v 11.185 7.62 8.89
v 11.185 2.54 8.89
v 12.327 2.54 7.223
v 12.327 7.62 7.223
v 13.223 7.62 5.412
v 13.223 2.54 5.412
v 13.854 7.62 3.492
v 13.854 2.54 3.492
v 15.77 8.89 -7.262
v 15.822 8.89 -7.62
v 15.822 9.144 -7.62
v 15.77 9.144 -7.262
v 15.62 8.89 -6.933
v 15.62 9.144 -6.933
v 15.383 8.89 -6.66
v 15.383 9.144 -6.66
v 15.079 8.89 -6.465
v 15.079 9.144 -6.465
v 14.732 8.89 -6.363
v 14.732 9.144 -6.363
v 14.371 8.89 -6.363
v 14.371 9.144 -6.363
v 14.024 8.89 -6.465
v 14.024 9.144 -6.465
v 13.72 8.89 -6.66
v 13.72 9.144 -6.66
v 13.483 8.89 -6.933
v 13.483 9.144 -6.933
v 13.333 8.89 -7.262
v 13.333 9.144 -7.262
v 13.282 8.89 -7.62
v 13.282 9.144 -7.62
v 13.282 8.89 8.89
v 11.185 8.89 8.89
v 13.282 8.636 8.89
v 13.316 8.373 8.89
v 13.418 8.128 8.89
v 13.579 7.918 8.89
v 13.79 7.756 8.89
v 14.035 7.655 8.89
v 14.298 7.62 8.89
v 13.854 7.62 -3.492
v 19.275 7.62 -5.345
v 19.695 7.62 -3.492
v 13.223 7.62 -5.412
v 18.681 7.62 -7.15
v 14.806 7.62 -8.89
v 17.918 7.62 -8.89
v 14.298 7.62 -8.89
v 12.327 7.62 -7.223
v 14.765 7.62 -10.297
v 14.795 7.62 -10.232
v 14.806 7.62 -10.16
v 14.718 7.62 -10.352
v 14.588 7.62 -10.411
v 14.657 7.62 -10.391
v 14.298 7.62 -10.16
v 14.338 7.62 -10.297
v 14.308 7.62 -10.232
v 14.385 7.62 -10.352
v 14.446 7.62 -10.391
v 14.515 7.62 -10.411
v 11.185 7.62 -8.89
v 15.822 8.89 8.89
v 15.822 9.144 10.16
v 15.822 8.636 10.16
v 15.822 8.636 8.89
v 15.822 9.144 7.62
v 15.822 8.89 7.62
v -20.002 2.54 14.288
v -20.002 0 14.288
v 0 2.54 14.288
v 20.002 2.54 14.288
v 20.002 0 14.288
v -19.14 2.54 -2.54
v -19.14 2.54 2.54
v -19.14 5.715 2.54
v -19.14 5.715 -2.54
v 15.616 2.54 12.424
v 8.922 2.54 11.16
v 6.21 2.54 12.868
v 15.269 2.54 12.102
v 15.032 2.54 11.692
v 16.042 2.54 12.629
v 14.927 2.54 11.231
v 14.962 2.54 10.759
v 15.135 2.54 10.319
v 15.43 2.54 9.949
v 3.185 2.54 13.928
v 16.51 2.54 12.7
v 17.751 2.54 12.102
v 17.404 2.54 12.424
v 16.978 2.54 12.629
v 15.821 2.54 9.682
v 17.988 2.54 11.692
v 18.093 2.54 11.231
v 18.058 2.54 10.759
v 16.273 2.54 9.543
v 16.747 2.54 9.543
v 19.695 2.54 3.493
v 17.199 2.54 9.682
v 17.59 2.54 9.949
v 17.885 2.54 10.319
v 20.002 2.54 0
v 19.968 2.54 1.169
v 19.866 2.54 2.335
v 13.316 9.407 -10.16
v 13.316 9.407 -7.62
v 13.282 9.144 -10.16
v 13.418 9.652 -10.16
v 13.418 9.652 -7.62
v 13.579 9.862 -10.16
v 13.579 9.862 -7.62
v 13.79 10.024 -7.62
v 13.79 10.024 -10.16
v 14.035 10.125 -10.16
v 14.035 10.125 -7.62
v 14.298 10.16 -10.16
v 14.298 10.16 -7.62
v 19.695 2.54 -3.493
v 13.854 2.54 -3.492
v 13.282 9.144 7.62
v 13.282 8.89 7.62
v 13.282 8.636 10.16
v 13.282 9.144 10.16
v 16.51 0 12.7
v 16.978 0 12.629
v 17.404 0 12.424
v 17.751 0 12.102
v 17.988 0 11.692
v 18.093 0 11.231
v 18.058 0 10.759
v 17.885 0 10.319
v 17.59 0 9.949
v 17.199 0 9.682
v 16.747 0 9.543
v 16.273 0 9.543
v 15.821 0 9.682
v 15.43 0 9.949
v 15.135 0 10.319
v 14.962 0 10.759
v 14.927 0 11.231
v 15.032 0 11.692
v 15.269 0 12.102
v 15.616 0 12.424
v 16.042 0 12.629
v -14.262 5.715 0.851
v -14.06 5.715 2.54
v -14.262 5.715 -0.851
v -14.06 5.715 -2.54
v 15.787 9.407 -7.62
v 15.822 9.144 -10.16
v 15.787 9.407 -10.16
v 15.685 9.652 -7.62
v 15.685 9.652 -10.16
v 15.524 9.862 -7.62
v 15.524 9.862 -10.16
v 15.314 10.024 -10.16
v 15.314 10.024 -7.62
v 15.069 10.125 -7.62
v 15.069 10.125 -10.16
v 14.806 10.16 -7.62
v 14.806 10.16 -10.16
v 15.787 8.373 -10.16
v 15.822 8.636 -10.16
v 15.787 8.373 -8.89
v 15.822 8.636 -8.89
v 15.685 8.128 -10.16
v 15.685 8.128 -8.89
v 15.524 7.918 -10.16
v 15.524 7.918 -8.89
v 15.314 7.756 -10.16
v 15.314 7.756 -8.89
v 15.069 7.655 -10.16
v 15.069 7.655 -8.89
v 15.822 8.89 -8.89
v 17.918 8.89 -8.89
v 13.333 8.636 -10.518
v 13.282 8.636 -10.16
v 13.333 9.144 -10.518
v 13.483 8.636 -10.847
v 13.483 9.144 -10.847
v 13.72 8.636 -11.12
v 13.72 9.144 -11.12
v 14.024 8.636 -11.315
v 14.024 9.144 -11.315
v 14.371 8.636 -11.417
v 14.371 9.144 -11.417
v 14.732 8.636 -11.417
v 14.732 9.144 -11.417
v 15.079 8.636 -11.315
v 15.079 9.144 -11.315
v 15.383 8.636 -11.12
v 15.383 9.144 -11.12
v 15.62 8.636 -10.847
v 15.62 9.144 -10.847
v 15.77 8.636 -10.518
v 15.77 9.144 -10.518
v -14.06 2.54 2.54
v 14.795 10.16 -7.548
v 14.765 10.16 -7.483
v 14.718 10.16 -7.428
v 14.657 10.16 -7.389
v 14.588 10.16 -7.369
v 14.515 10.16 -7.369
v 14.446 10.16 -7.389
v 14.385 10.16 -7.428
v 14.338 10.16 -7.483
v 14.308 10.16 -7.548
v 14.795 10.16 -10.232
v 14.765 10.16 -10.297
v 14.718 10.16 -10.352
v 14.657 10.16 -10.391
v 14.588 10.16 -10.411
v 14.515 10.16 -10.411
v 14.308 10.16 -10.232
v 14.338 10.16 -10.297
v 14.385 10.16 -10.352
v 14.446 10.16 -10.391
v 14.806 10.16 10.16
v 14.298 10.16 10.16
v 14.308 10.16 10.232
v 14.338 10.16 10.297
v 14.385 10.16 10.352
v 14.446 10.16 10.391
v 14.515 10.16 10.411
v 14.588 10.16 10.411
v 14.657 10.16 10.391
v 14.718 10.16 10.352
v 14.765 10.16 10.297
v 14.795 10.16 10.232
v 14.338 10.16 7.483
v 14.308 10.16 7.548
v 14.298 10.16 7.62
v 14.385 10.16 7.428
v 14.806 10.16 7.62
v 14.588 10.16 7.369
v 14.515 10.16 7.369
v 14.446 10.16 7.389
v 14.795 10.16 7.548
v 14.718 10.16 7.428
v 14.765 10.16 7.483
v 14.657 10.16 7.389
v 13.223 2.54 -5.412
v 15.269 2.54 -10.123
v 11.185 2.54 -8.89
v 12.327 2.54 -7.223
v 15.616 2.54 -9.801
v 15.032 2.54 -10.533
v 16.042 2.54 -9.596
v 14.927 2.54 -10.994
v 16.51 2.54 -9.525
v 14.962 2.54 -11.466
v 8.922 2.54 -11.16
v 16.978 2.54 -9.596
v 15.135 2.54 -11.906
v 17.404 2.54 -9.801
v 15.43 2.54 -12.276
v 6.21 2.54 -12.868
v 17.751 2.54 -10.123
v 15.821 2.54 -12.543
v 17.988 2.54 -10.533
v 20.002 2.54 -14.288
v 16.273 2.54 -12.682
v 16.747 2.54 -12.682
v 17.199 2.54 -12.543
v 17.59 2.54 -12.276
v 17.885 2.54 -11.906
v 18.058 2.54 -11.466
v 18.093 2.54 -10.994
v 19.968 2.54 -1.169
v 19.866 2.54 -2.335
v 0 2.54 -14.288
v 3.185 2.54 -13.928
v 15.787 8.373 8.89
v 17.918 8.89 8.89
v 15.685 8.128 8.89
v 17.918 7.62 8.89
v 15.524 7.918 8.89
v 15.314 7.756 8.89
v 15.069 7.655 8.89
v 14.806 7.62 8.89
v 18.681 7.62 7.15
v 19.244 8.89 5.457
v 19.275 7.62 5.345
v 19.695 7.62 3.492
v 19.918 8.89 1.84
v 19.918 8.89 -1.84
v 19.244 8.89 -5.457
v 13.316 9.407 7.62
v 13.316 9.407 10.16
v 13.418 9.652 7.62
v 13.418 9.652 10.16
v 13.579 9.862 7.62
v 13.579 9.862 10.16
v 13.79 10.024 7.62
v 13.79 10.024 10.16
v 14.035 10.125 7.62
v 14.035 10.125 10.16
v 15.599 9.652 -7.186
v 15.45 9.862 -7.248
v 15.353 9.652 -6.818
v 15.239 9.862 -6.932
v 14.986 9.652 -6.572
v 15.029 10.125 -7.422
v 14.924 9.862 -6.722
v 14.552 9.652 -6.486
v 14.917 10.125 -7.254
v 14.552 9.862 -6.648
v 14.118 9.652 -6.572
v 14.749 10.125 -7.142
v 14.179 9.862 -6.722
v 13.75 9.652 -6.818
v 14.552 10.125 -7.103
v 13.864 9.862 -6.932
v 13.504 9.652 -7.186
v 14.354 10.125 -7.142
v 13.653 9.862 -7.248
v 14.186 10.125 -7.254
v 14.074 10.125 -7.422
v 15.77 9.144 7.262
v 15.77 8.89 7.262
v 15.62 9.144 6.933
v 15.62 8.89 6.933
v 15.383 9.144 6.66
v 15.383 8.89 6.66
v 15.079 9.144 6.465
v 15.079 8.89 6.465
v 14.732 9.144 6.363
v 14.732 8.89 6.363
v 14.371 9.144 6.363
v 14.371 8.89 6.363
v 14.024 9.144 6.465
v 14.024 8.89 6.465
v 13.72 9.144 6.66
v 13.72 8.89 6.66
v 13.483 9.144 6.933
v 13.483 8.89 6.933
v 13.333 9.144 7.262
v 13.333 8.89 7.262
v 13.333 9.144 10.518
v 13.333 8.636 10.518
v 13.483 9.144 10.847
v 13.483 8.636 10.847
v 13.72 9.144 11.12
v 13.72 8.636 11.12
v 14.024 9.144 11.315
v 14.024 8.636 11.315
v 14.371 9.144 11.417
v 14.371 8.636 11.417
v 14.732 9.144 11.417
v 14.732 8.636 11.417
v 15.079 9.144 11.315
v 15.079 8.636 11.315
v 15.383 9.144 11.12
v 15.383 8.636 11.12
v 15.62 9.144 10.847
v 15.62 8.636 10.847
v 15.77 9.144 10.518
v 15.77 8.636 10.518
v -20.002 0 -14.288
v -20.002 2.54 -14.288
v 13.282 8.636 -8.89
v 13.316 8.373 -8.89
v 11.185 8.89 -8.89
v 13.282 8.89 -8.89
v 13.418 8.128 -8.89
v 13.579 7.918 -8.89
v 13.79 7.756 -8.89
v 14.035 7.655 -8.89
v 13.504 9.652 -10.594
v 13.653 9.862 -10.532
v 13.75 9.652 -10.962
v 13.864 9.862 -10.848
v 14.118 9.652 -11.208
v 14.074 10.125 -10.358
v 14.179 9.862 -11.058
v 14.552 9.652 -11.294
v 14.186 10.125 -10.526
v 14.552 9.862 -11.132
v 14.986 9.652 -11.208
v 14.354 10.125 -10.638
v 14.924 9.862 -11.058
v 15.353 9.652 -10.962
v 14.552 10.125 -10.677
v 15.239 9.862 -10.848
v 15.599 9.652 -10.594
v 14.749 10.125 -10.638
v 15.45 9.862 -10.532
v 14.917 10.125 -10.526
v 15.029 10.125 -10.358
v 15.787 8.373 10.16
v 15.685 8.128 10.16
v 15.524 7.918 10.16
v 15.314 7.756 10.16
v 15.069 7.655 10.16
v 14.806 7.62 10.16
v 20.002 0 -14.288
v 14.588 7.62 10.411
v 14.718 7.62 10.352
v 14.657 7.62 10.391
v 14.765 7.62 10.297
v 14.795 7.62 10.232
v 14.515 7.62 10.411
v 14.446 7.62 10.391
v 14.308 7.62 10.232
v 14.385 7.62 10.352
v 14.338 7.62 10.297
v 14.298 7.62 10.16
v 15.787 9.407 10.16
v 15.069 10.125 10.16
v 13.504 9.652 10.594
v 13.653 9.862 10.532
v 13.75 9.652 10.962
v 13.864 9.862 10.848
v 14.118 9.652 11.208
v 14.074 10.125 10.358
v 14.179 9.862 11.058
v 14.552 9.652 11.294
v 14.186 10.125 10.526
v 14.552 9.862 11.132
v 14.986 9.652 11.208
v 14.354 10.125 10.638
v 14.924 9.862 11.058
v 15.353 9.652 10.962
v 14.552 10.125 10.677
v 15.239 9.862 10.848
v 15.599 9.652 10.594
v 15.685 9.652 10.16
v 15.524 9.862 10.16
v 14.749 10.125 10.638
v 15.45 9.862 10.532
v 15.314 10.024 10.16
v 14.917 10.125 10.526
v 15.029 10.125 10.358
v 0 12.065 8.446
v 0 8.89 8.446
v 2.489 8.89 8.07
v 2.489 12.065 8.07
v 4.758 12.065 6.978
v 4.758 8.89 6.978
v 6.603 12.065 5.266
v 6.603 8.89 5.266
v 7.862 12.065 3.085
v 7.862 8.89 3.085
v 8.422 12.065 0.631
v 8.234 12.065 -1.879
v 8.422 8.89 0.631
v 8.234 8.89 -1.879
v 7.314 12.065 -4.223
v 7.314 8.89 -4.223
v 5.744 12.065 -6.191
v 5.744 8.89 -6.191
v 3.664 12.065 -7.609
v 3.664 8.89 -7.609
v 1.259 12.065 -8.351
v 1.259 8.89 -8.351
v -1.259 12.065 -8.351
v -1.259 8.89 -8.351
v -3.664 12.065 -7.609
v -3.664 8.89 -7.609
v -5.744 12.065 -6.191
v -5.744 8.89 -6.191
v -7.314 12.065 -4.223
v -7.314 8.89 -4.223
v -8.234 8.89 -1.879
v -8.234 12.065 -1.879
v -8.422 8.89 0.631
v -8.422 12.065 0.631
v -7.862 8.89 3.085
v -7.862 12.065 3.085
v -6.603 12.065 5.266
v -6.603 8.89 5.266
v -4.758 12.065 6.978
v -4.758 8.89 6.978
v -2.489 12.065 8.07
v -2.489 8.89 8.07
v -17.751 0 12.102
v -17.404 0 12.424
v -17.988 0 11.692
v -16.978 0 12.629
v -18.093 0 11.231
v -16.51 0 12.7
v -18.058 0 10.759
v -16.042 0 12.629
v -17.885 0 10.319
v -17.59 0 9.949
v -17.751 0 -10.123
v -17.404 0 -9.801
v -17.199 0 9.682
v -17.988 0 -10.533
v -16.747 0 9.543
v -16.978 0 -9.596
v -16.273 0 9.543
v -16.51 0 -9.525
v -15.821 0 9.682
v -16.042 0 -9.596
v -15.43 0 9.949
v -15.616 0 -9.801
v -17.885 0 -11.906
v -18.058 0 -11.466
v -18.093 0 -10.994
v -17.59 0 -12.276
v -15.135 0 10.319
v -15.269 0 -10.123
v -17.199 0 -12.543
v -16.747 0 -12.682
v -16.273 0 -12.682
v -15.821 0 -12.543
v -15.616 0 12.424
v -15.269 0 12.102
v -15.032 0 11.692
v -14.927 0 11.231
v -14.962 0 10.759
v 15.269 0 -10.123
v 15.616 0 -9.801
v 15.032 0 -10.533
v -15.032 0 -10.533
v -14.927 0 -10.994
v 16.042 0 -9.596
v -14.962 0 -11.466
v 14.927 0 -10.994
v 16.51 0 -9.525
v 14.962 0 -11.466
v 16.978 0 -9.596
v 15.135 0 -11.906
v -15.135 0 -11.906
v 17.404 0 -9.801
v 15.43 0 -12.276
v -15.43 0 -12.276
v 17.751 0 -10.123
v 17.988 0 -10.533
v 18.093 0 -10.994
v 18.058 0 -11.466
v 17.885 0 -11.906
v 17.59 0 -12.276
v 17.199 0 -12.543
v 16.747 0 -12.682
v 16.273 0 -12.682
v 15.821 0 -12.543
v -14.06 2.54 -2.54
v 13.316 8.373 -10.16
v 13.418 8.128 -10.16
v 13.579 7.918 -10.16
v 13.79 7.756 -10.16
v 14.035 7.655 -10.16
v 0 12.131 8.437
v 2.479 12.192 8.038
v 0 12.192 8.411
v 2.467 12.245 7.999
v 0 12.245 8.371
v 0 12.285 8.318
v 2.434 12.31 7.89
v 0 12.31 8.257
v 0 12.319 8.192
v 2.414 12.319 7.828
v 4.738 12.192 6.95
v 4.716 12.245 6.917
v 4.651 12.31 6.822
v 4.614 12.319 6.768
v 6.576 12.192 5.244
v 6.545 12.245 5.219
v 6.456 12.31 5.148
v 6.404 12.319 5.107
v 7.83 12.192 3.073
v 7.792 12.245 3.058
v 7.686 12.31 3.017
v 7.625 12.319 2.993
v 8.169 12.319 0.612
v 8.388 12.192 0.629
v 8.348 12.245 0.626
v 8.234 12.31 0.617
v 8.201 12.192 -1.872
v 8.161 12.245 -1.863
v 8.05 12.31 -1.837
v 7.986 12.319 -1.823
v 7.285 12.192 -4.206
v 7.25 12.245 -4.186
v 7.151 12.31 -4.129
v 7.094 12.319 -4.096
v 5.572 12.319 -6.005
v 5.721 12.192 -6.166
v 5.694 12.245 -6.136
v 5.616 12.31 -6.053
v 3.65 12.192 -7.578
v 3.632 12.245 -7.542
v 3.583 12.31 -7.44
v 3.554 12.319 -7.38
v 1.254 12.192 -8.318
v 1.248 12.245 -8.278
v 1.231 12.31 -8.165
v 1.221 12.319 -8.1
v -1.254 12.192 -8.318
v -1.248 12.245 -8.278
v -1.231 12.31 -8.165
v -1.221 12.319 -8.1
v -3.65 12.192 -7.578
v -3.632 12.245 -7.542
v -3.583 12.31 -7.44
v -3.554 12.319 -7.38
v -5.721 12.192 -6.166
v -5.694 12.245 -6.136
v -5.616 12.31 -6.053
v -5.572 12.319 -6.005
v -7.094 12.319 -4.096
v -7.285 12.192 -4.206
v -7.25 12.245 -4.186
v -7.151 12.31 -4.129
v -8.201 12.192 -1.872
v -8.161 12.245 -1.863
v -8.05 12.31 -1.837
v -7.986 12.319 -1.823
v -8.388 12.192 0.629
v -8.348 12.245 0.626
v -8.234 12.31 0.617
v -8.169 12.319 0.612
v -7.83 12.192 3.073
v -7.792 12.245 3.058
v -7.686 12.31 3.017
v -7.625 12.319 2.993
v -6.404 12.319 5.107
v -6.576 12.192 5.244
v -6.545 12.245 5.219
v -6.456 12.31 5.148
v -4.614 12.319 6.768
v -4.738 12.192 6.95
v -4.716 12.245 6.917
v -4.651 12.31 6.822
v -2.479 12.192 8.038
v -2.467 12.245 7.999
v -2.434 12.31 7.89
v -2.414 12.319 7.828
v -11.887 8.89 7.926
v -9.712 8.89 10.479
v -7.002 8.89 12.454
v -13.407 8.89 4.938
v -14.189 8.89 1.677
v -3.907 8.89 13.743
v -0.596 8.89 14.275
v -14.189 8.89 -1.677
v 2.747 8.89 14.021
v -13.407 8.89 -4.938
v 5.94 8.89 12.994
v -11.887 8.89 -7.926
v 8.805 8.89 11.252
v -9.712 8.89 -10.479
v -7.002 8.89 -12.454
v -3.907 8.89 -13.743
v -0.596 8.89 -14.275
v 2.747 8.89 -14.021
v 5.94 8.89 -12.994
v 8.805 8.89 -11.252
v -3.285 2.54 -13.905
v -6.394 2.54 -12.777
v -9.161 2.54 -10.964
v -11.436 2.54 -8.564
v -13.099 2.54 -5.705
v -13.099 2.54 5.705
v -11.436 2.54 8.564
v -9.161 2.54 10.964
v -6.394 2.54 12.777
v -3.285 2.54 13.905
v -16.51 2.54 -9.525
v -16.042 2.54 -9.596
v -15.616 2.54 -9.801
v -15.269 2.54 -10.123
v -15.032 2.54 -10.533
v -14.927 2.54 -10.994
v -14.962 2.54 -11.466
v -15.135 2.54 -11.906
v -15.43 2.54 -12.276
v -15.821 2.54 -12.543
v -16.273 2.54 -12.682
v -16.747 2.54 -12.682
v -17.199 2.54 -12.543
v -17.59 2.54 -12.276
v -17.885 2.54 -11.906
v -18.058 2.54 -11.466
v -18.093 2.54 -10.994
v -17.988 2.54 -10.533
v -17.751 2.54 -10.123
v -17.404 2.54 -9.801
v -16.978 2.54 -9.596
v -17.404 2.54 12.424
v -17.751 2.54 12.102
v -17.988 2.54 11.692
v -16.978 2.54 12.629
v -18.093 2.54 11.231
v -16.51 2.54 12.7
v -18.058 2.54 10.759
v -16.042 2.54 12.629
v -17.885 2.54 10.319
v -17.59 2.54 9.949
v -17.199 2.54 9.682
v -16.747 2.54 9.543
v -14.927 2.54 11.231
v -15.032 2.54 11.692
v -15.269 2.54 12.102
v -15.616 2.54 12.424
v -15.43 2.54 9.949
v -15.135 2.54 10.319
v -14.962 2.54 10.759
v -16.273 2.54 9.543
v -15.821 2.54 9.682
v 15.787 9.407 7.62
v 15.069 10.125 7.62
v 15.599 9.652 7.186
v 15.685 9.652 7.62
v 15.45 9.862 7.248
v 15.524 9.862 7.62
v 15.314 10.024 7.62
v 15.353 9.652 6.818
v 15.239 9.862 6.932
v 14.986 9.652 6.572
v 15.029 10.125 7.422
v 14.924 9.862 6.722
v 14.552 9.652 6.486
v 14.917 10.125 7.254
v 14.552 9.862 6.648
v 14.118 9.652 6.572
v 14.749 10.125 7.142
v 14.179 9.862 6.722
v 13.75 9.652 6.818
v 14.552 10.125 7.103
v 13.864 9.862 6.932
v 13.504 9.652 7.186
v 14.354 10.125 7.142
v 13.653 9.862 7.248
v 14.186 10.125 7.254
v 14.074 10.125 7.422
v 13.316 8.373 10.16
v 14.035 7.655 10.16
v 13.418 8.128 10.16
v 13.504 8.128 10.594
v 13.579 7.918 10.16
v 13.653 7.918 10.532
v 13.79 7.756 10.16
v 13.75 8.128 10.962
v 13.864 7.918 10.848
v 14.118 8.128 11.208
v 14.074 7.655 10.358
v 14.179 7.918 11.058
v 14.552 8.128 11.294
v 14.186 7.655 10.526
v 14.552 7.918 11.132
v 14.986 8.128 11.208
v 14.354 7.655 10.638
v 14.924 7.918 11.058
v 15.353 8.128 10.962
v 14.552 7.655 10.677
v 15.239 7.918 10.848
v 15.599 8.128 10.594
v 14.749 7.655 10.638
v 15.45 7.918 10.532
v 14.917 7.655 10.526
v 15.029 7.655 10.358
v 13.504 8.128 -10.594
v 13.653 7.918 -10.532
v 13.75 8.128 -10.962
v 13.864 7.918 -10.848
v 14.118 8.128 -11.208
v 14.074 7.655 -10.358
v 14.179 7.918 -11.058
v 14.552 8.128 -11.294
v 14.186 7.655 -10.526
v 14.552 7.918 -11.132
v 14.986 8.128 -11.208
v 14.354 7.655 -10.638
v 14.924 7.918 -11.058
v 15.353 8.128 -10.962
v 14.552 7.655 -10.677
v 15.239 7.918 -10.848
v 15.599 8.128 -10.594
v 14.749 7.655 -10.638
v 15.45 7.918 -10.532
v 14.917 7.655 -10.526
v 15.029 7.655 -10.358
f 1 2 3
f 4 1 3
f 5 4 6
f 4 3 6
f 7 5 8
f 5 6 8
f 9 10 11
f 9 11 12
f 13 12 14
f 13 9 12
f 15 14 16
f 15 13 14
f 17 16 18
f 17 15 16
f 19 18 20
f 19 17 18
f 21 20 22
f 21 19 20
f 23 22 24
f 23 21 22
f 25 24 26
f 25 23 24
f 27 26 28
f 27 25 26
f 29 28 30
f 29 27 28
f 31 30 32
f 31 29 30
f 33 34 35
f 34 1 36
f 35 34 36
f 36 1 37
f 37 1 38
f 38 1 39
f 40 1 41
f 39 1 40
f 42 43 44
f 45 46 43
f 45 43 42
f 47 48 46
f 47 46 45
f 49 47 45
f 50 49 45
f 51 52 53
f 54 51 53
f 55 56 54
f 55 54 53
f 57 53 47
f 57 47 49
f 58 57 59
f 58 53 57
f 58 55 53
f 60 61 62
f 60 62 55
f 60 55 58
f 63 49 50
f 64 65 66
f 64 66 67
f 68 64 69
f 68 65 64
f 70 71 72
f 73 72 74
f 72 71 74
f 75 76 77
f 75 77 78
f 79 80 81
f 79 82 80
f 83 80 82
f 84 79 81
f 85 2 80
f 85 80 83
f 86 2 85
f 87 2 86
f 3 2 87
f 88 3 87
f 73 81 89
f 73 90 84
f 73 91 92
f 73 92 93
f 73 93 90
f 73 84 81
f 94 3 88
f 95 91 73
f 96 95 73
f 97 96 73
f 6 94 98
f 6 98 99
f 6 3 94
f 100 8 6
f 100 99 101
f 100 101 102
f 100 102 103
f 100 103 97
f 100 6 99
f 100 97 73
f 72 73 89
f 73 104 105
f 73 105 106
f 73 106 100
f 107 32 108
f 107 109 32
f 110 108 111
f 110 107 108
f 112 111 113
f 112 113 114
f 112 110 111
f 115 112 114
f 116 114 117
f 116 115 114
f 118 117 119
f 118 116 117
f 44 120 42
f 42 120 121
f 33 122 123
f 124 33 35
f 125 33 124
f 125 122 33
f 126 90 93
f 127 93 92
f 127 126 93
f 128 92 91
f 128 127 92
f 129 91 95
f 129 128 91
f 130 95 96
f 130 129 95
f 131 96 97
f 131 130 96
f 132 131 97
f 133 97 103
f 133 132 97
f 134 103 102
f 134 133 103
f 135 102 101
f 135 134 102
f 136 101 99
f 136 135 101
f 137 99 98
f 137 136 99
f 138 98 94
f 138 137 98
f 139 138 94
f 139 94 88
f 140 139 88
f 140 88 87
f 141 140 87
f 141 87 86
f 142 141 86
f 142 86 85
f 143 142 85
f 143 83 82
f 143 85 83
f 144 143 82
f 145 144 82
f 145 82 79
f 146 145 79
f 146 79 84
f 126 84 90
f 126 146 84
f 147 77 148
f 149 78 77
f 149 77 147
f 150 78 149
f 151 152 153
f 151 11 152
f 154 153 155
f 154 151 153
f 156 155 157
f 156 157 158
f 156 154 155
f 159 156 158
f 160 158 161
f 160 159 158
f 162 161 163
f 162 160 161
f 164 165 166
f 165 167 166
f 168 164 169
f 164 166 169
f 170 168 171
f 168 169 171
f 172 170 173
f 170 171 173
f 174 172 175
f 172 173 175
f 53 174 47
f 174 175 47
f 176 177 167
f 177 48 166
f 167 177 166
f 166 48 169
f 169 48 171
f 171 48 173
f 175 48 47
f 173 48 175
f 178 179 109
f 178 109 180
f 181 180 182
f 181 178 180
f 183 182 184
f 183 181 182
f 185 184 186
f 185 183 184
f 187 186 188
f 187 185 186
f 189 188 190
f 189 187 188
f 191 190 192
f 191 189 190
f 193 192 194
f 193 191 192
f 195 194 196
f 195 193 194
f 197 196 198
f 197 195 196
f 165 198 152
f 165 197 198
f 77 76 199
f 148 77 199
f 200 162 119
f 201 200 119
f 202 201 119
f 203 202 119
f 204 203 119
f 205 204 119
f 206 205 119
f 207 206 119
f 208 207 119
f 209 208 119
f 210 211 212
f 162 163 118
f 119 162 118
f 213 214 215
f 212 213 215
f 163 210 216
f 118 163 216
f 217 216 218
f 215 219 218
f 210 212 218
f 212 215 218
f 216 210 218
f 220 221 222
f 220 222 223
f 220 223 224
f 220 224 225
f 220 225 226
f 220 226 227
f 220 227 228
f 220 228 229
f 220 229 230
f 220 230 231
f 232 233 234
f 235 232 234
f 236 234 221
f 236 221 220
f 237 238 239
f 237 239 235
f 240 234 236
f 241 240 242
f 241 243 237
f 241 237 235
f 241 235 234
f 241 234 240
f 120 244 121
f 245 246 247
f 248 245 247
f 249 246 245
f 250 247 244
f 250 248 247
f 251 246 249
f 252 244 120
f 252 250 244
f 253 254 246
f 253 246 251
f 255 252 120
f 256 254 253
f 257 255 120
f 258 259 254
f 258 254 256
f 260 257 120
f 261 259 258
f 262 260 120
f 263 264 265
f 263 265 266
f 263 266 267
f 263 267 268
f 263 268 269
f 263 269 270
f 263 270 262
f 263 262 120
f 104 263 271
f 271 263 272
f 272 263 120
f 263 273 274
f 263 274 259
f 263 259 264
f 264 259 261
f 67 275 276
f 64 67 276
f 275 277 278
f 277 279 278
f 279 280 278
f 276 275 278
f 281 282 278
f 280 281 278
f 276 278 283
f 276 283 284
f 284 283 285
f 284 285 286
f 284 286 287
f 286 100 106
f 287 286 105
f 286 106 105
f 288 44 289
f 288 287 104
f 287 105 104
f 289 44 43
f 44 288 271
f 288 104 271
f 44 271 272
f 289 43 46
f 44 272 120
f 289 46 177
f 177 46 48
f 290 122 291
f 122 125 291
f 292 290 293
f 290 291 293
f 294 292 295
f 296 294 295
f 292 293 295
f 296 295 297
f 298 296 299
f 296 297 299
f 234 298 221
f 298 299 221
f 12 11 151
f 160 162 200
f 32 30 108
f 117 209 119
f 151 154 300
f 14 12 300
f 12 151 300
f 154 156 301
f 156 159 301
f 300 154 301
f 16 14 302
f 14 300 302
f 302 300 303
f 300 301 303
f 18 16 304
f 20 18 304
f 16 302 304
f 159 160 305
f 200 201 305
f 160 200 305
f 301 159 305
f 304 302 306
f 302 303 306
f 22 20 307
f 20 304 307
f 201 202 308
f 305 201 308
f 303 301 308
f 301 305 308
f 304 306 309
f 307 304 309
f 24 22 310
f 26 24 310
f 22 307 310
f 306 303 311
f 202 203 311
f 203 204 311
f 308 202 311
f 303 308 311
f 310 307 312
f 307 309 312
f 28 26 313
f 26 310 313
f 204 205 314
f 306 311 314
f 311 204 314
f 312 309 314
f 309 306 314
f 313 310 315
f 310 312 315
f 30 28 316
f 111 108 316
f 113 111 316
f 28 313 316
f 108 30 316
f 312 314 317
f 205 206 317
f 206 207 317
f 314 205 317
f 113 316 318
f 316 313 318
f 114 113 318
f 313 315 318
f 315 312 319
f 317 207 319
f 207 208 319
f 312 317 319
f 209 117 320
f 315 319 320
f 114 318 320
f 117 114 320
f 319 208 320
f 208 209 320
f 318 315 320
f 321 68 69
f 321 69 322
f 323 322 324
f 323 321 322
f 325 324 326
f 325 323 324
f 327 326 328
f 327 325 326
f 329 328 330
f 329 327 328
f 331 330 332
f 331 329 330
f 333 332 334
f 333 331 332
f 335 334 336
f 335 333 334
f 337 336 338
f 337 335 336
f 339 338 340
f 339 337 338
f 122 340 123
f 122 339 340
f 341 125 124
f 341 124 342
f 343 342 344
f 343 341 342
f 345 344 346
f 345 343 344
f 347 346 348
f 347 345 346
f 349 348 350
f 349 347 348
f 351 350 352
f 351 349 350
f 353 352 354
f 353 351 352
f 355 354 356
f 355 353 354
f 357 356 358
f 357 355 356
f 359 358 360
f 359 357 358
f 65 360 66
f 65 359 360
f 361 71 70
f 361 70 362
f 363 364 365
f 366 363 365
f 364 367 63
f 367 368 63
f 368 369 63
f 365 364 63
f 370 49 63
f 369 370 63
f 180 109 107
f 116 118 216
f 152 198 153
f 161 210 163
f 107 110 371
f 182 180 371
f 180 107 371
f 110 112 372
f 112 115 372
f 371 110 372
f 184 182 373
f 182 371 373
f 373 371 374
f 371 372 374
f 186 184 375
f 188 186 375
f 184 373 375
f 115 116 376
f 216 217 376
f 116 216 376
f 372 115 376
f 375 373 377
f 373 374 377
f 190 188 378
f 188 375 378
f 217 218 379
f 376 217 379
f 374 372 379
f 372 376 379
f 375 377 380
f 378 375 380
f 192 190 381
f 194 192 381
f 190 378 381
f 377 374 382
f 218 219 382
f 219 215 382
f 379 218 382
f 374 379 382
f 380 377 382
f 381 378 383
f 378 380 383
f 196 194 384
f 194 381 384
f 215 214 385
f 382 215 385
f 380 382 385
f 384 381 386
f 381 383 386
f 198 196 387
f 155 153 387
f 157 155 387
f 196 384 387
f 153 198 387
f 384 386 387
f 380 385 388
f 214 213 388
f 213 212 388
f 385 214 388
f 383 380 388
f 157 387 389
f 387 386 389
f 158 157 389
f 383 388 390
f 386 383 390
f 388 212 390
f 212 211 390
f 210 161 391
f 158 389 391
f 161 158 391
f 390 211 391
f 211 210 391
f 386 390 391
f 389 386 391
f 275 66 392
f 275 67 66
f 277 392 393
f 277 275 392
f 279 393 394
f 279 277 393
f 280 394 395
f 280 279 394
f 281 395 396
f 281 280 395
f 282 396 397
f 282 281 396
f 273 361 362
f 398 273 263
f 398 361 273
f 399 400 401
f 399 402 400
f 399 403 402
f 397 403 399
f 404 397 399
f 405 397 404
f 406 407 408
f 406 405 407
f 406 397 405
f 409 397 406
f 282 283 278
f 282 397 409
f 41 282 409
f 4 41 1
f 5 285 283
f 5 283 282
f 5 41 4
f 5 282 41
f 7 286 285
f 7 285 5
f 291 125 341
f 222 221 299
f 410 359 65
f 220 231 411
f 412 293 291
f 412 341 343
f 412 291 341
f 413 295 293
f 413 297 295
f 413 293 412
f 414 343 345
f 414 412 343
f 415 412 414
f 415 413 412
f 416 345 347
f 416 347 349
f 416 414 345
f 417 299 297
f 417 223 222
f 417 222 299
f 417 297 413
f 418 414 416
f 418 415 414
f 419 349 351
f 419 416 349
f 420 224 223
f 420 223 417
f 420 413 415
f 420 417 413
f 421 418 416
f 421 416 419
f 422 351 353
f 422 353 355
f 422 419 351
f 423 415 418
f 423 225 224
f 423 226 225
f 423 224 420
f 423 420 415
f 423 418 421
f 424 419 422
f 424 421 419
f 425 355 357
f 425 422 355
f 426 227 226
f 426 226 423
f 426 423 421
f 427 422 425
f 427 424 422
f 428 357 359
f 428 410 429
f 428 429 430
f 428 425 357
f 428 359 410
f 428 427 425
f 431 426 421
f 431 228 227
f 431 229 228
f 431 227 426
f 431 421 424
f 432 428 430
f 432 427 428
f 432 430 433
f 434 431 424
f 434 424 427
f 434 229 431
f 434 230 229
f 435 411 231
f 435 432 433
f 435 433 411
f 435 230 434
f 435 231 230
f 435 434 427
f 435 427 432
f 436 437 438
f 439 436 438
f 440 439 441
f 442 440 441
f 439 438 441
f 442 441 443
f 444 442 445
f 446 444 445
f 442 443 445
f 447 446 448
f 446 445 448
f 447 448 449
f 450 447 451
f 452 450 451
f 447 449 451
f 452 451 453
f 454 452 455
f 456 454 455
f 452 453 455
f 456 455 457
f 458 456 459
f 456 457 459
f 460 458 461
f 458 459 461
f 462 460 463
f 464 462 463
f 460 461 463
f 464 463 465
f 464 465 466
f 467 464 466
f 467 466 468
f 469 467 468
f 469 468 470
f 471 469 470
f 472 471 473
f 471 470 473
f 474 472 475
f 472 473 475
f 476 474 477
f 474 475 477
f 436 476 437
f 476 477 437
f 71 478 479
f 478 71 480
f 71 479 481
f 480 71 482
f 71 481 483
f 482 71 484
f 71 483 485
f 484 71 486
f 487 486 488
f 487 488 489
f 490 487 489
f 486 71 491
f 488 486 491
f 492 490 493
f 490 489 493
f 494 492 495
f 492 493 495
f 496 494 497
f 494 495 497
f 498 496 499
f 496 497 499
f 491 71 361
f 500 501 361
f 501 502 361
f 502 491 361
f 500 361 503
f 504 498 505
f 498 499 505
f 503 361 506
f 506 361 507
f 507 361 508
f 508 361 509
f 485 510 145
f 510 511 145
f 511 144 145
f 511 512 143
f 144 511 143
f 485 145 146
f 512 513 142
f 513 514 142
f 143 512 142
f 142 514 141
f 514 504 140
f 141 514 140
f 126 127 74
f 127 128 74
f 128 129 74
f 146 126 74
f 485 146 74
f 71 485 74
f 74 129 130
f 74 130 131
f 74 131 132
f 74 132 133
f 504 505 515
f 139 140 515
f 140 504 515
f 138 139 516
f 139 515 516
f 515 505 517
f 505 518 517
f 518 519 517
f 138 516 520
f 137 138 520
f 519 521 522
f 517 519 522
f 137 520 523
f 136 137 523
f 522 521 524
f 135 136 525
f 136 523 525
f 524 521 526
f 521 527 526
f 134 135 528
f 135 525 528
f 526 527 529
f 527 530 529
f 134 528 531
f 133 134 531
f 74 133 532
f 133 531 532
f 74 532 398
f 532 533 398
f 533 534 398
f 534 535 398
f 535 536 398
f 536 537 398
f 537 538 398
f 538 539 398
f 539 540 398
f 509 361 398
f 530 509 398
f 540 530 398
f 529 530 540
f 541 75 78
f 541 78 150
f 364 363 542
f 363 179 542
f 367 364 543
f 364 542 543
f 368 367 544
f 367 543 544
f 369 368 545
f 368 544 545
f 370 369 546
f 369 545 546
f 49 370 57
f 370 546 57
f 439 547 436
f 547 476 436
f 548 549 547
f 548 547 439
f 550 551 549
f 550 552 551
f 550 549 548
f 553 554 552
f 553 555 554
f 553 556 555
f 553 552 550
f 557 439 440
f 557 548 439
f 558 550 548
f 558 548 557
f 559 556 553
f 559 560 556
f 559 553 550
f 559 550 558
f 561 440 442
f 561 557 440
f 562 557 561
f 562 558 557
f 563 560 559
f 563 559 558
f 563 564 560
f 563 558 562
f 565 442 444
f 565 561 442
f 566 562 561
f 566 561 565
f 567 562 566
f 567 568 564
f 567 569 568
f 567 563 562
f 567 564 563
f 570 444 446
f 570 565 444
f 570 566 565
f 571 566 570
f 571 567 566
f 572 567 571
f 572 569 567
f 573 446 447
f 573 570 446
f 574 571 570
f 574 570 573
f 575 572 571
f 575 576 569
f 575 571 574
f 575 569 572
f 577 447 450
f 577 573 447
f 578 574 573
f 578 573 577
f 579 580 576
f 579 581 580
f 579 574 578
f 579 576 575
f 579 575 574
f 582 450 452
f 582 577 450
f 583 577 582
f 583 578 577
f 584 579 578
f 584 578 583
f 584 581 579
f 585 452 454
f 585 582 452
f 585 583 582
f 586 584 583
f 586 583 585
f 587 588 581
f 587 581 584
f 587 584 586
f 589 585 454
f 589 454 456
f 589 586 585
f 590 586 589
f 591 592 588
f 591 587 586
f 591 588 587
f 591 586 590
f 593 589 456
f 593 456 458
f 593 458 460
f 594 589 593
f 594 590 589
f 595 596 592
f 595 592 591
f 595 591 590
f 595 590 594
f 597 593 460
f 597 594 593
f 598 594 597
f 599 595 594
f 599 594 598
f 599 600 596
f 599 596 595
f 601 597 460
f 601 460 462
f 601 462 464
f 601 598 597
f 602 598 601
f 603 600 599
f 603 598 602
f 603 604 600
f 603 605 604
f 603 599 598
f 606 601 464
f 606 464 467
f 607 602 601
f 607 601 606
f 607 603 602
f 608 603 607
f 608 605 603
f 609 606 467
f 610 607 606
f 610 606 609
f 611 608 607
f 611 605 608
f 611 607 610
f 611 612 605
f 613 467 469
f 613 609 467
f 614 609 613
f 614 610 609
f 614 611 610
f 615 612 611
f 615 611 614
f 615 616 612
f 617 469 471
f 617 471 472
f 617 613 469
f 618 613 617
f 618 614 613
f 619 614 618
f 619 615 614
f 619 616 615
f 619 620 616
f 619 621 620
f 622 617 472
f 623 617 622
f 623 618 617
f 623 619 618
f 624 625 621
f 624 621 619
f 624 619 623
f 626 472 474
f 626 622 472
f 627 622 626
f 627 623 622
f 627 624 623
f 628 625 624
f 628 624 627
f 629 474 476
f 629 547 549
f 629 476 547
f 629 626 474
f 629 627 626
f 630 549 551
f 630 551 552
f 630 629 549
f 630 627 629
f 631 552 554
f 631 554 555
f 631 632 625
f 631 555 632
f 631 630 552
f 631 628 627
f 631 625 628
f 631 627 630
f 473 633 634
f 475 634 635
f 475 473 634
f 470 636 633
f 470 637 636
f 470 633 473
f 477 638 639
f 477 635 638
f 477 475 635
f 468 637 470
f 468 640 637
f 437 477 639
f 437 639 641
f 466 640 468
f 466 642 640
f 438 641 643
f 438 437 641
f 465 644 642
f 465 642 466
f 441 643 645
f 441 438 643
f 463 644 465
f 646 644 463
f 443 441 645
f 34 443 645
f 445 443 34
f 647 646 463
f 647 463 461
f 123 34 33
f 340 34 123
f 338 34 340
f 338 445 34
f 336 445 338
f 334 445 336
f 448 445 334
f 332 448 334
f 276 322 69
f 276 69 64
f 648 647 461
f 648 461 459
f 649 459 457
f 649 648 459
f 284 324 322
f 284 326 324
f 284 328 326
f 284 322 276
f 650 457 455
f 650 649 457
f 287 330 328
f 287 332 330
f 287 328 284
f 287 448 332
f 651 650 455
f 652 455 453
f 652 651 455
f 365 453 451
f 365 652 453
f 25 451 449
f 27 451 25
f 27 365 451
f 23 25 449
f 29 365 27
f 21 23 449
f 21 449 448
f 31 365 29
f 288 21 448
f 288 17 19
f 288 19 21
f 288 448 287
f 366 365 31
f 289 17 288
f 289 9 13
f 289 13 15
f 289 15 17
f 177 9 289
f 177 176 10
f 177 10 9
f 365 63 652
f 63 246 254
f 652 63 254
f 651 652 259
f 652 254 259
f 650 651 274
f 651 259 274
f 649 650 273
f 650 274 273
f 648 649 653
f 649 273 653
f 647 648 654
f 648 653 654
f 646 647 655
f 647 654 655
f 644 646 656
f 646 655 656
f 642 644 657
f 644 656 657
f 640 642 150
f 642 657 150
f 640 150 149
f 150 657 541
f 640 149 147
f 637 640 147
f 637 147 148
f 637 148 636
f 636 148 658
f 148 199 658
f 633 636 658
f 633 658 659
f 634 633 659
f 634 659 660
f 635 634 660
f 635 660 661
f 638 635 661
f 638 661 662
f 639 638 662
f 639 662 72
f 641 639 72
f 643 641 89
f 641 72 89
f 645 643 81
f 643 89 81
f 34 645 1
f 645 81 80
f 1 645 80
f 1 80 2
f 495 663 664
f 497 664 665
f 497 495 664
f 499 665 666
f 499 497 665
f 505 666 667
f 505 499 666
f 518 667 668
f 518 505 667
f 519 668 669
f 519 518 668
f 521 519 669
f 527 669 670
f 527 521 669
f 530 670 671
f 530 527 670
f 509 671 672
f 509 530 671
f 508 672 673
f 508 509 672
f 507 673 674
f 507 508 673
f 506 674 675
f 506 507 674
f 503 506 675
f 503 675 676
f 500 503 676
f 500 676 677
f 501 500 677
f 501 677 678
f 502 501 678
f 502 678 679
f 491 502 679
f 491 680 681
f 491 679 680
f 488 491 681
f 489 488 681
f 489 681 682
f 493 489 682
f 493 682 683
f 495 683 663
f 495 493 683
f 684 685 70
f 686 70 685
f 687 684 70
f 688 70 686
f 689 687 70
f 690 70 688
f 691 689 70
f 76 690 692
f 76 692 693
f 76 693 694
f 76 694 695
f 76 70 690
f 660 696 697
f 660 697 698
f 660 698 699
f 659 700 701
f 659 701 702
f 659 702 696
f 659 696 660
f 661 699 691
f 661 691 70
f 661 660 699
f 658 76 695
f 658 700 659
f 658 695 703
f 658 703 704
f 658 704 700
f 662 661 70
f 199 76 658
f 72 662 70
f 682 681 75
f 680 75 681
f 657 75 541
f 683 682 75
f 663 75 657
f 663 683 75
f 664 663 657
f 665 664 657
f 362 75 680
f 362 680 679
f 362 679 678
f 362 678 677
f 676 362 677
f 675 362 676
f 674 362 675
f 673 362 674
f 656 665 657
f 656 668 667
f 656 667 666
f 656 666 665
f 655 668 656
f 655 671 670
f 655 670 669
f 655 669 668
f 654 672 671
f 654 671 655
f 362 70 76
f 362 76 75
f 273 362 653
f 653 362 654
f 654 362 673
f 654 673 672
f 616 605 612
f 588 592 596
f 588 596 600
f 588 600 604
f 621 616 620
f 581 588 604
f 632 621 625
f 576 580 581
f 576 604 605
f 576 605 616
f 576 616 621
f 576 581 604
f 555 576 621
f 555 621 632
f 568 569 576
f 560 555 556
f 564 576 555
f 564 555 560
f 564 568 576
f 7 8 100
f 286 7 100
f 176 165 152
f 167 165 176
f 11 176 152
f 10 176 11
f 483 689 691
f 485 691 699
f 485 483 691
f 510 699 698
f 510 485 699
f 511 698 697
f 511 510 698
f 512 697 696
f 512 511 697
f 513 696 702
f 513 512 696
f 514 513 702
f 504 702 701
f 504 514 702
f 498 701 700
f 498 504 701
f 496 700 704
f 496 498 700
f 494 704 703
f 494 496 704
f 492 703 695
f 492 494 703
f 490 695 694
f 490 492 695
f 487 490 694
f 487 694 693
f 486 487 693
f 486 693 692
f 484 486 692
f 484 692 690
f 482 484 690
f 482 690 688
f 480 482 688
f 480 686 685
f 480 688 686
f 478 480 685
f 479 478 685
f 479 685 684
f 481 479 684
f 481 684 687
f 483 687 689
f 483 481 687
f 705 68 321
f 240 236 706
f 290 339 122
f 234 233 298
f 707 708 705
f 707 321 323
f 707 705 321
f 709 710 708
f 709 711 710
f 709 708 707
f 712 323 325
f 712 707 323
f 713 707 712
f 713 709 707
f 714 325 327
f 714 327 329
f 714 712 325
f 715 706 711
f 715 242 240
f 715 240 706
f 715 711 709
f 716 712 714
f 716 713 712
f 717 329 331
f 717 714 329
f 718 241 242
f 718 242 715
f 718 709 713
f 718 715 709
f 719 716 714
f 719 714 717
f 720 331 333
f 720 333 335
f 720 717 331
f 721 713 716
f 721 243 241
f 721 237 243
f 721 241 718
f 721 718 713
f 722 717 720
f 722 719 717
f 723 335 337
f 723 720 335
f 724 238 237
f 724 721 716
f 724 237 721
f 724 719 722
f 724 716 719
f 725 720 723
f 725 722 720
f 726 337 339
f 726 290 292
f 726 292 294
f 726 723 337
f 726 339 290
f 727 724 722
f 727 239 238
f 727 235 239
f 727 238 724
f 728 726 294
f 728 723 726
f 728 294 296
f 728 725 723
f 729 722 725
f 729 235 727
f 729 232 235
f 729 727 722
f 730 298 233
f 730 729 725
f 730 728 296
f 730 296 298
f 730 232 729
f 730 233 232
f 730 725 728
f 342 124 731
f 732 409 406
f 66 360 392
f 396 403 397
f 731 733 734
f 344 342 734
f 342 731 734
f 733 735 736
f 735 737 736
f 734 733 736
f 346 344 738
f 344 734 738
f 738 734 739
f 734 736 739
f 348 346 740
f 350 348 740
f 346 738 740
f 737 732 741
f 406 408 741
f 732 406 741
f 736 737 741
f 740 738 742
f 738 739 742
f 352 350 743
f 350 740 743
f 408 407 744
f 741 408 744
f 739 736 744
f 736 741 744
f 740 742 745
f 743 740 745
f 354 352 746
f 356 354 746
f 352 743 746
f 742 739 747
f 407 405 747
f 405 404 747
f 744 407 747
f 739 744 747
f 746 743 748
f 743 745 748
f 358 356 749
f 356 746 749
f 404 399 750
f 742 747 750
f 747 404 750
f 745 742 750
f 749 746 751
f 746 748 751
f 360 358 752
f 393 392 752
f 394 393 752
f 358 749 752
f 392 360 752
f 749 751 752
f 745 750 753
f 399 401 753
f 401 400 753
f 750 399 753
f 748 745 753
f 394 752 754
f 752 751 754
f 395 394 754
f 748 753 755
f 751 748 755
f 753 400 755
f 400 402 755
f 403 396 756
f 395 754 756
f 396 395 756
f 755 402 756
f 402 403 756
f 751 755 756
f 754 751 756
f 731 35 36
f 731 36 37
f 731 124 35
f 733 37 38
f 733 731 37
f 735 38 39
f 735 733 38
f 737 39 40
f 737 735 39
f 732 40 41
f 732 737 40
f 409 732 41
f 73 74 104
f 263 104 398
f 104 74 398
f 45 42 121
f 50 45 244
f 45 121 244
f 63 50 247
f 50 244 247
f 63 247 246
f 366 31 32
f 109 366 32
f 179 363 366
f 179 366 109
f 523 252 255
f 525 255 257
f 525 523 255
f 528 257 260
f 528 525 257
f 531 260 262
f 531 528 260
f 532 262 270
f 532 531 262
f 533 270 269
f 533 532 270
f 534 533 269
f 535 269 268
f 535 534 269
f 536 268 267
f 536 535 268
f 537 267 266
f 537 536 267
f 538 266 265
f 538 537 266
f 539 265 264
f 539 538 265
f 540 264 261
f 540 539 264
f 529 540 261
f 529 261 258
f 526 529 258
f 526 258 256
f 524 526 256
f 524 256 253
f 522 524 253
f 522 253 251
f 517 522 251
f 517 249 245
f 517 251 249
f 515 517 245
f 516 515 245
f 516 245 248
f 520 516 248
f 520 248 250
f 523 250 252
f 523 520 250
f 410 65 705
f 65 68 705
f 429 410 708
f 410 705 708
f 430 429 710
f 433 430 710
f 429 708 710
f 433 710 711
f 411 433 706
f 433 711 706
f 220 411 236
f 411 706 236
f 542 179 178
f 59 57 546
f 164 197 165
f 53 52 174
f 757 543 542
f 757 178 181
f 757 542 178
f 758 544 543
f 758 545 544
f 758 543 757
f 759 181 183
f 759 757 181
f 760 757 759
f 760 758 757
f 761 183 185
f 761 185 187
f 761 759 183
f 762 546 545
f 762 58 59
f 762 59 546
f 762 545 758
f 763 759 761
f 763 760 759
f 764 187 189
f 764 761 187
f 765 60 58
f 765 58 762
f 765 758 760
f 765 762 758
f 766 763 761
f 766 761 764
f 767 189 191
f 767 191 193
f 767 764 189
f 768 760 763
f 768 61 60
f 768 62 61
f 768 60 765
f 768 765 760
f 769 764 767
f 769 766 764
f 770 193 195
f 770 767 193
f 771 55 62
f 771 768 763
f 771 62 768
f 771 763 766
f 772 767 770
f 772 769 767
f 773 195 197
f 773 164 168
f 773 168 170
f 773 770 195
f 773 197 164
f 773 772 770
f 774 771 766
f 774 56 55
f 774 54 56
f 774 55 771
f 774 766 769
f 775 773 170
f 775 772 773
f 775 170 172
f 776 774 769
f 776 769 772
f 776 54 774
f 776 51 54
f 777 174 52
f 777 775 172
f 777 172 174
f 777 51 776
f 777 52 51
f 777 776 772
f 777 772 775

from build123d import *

# Parameters (mm, degrees)
SKETCH1_W           = 40.005
SKETCH1_H           = 28.575
BOSS_EXTRUDE1_DEPTH = 2.54
SKETCH2_R           = 1.5875
CUT_EXTRUDE1_DEPTH  = 25.712026677
SKETCH3_R           = 14.2875
BOSS_EXTRUDE2_DEPTH = 6.35
SKETCH4_R           = 8.4455
BOSS_EXTRUDE3_DEPTH = 3.429
FILLET1_R           = 0.254
SKETCH5_W           = 6.003121546
SKETCH5_H           = 5.08
BOSS_EXTRUDE4_DEPTH = 3.175
BOSS_EXTRUDE5_DEPTH = 6.35
BOSS_EXTRUDE6_DEPTH = 1.27
FILLET2_R           = 1.016
CUT_EXTRUDE2_DEPTH  = 5.08


with BuildPart() as part:
    # Sketch1 → Boss-Extrude1 (new body)
    with BuildSketch(Plane(origin=(0, 0, 0), x_dir=(1, 0, 0), z_dir=(0, 1, 0))):
        Rectangle(SKETCH1_W, SKETCH1_H)
    extrude(amount=BOSS_EXTRUDE1_DEPTH)

    # Sketch2 → Cut-Extrude1 (cut, through all)
    with BuildSketch(Plane(origin=(0, 0, 0), x_dir=(1, 0, 0), z_dir=(0, 1, 0))):
        with Locations(Location((-16.51, 11.1125, 0), (0, 0, 270))):
            Circle(SKETCH2_R)
        with Locations(Location((16.51, 11.1125, 0), (0, 0, 270))):
            Circle(SKETCH2_R)
        with Locations(Location((16.51, -11.1125, 0), (0, 0, 270))):
            Circle(SKETCH2_R)
        with Locations(Location((-16.51, -11.1125, 0), (0, 0, 270))):
            Circle(SKETCH2_R)
    extrude(amount=CUT_EXTRUDE1_DEPTH, mode=Mode.SUBTRACT)

    # Sketch3 → Boss-Extrude2 (add)
    with BuildSketch(Plane(origin=(0, 2.54, 0), x_dir=(1, 0, 0), z_dir=(0, 1, 0))):
        with Locations(Location((0, 0, 0), (0, 0, 270))):
            Circle(SKETCH3_R)
    extrude(amount=BOSS_EXTRUDE2_DEPTH)

    # Sketch4 → Boss-Extrude3 (add)
    with BuildSketch(Plane(origin=(0, 8.89, 0), x_dir=(1, 0, 0), z_dir=(0, 1, 0))):
        with Locations(Location((0, 0, 0), (0, 0, 270))):
            Circle(SKETCH4_R)
    extrude(amount=BOSS_EXTRUDE3_DEPTH)

    # Fillet1
    fillet1_edges = [part.edges().sort_by_distance(p)[0] for p in [
        (0, 12.319, -8.4455),
    ]]
    fillet(fillet1_edges, radius=FILLET1_R)

    # Sketch5 → Boss-Extrude4 (add)
    with BuildSketch(Plane(origin=(0, 2.54, 0), x_dir=(1, 0, 0), z_dir=(0, 1, 0))):
        with Locations((-16.138348766, 0)):
            Rectangle(SKETCH5_W, SKETCH5_H)
    extrude(amount=BOSS_EXTRUDE4_DEPTH)

    # Sketch6 → Boss-Extrude5 (add)
    with BuildSketch(Plane(origin=(0, 2.54, 0), x_dir=(1, 0, 0), z_dir=(0, 1, 0))):
        with BuildLine():
            Line((11.184835996, -8.89), (17.918367846, -8.89))
            ThreePointArc((17.918367846, -8.89), (20.0025, 0), (17.918367846, 8.89))
            Line((17.918367846, 8.89), (11.184835996, 8.89))
            ThreePointArc((11.184835996, 8.89), (14.2875, 0), (11.184835996, -8.89))
        make_face()
    extrude(amount=BOSS_EXTRUDE5_DEPTH)

    # Sketch7 → Boss-Extrude6 (add, symmetric)
    with BuildSketch(Plane(origin=(0, 8.89, 0), x_dir=(1, 0, 0), z_dir=(0, 1, 0))):
        with BuildLine():
            Line((13.281601921, 7.62), (13.281601921, 10.16))
            ThreePointArc((13.281601921, 10.16), (14.551601921, 11.43), (15.821601921, 10.16))
            Line((15.821601921, 10.16), (15.821601921, 7.62))
            ThreePointArc((15.821601921, 7.62), (14.551601921, 6.35), (13.281601921, 7.62))
        make_face()
        with BuildLine():
            Line((13.281601921, -7.62), (13.281601921, -10.16))
            ThreePointArc((13.281601921, -10.16), (14.551601921, -11.43), (15.821601921, -10.16))
            Line((15.821601921, -10.16), (15.821601921, -7.62))
            ThreePointArc((15.821601921, -7.62), (14.551601921, -6.35), (13.281601921, -7.62))
        make_face()
    extrude(amount=BOSS_EXTRUDE6_DEPTH, both=True)

    # Fillet2
    fillet2_edges = [part.edges().sort_by_distance(p)[0] for p in [
        (13.281601921, 7.62, 9.525),
        (14.551601921, 7.62, 11.43),
        (15.821601921, 7.62, 9.525),
        (14.551601921, 10.16, 6.35),
        (13.281601921, 10.16, 8.89),
        (14.551601921, 10.16, 11.43),
        (15.821601921, 10.16, 8.89),
        (15.821601921, 7.62, -9.525),
        (14.551601921, 7.62, -11.43),
        (13.281601921, 7.62, -9.525),
        (14.551601921, 10.16, -6.35),
        (15.821601921, 10.16, -8.89),
        (14.551601921, 10.16, -11.43),
        (13.281601921, 10.16, -8.89),
    ]]
    fillet(fillet2_edges, radius=FILLET2_R)

    # Sketch9 → Cut-Extrude2 (cut)
    with BuildSketch(Plane(origin=(0, 2.54, 0), x_dir=(1, 0, 0), z_dir=(0, 1, 0))):
        with BuildLine():
            Line((0, 14.2875), (31.753560491, 14.2875))
            Line((31.753560491, 14.2875), (31.753560491, 3.4925))
            Line((31.753560491, 3.4925), (13.854064386, 3.4925))
            ThreePointArc((13.854064386, 3.4925), (8.781616096, 11.270131987), (0, 14.2875))
        make_face()
        with BuildLine():
            Line((13.854064386, -3.4925), (31.753560491, -3.4925))
            Line((31.753560491, -3.4925), (31.753560491, -14.2875))
            Line((31.753560491, -14.2875), (0, -14.2875))
            ThreePointArc((0, -14.2875), (8.781616096, -11.270131987), (13.854064386, -3.4925))
        make_face()
    extrude(amount=CUT_EXTRUDE2_DEPTH, mode=Mode.SUBTRACT)


solid = part.part
